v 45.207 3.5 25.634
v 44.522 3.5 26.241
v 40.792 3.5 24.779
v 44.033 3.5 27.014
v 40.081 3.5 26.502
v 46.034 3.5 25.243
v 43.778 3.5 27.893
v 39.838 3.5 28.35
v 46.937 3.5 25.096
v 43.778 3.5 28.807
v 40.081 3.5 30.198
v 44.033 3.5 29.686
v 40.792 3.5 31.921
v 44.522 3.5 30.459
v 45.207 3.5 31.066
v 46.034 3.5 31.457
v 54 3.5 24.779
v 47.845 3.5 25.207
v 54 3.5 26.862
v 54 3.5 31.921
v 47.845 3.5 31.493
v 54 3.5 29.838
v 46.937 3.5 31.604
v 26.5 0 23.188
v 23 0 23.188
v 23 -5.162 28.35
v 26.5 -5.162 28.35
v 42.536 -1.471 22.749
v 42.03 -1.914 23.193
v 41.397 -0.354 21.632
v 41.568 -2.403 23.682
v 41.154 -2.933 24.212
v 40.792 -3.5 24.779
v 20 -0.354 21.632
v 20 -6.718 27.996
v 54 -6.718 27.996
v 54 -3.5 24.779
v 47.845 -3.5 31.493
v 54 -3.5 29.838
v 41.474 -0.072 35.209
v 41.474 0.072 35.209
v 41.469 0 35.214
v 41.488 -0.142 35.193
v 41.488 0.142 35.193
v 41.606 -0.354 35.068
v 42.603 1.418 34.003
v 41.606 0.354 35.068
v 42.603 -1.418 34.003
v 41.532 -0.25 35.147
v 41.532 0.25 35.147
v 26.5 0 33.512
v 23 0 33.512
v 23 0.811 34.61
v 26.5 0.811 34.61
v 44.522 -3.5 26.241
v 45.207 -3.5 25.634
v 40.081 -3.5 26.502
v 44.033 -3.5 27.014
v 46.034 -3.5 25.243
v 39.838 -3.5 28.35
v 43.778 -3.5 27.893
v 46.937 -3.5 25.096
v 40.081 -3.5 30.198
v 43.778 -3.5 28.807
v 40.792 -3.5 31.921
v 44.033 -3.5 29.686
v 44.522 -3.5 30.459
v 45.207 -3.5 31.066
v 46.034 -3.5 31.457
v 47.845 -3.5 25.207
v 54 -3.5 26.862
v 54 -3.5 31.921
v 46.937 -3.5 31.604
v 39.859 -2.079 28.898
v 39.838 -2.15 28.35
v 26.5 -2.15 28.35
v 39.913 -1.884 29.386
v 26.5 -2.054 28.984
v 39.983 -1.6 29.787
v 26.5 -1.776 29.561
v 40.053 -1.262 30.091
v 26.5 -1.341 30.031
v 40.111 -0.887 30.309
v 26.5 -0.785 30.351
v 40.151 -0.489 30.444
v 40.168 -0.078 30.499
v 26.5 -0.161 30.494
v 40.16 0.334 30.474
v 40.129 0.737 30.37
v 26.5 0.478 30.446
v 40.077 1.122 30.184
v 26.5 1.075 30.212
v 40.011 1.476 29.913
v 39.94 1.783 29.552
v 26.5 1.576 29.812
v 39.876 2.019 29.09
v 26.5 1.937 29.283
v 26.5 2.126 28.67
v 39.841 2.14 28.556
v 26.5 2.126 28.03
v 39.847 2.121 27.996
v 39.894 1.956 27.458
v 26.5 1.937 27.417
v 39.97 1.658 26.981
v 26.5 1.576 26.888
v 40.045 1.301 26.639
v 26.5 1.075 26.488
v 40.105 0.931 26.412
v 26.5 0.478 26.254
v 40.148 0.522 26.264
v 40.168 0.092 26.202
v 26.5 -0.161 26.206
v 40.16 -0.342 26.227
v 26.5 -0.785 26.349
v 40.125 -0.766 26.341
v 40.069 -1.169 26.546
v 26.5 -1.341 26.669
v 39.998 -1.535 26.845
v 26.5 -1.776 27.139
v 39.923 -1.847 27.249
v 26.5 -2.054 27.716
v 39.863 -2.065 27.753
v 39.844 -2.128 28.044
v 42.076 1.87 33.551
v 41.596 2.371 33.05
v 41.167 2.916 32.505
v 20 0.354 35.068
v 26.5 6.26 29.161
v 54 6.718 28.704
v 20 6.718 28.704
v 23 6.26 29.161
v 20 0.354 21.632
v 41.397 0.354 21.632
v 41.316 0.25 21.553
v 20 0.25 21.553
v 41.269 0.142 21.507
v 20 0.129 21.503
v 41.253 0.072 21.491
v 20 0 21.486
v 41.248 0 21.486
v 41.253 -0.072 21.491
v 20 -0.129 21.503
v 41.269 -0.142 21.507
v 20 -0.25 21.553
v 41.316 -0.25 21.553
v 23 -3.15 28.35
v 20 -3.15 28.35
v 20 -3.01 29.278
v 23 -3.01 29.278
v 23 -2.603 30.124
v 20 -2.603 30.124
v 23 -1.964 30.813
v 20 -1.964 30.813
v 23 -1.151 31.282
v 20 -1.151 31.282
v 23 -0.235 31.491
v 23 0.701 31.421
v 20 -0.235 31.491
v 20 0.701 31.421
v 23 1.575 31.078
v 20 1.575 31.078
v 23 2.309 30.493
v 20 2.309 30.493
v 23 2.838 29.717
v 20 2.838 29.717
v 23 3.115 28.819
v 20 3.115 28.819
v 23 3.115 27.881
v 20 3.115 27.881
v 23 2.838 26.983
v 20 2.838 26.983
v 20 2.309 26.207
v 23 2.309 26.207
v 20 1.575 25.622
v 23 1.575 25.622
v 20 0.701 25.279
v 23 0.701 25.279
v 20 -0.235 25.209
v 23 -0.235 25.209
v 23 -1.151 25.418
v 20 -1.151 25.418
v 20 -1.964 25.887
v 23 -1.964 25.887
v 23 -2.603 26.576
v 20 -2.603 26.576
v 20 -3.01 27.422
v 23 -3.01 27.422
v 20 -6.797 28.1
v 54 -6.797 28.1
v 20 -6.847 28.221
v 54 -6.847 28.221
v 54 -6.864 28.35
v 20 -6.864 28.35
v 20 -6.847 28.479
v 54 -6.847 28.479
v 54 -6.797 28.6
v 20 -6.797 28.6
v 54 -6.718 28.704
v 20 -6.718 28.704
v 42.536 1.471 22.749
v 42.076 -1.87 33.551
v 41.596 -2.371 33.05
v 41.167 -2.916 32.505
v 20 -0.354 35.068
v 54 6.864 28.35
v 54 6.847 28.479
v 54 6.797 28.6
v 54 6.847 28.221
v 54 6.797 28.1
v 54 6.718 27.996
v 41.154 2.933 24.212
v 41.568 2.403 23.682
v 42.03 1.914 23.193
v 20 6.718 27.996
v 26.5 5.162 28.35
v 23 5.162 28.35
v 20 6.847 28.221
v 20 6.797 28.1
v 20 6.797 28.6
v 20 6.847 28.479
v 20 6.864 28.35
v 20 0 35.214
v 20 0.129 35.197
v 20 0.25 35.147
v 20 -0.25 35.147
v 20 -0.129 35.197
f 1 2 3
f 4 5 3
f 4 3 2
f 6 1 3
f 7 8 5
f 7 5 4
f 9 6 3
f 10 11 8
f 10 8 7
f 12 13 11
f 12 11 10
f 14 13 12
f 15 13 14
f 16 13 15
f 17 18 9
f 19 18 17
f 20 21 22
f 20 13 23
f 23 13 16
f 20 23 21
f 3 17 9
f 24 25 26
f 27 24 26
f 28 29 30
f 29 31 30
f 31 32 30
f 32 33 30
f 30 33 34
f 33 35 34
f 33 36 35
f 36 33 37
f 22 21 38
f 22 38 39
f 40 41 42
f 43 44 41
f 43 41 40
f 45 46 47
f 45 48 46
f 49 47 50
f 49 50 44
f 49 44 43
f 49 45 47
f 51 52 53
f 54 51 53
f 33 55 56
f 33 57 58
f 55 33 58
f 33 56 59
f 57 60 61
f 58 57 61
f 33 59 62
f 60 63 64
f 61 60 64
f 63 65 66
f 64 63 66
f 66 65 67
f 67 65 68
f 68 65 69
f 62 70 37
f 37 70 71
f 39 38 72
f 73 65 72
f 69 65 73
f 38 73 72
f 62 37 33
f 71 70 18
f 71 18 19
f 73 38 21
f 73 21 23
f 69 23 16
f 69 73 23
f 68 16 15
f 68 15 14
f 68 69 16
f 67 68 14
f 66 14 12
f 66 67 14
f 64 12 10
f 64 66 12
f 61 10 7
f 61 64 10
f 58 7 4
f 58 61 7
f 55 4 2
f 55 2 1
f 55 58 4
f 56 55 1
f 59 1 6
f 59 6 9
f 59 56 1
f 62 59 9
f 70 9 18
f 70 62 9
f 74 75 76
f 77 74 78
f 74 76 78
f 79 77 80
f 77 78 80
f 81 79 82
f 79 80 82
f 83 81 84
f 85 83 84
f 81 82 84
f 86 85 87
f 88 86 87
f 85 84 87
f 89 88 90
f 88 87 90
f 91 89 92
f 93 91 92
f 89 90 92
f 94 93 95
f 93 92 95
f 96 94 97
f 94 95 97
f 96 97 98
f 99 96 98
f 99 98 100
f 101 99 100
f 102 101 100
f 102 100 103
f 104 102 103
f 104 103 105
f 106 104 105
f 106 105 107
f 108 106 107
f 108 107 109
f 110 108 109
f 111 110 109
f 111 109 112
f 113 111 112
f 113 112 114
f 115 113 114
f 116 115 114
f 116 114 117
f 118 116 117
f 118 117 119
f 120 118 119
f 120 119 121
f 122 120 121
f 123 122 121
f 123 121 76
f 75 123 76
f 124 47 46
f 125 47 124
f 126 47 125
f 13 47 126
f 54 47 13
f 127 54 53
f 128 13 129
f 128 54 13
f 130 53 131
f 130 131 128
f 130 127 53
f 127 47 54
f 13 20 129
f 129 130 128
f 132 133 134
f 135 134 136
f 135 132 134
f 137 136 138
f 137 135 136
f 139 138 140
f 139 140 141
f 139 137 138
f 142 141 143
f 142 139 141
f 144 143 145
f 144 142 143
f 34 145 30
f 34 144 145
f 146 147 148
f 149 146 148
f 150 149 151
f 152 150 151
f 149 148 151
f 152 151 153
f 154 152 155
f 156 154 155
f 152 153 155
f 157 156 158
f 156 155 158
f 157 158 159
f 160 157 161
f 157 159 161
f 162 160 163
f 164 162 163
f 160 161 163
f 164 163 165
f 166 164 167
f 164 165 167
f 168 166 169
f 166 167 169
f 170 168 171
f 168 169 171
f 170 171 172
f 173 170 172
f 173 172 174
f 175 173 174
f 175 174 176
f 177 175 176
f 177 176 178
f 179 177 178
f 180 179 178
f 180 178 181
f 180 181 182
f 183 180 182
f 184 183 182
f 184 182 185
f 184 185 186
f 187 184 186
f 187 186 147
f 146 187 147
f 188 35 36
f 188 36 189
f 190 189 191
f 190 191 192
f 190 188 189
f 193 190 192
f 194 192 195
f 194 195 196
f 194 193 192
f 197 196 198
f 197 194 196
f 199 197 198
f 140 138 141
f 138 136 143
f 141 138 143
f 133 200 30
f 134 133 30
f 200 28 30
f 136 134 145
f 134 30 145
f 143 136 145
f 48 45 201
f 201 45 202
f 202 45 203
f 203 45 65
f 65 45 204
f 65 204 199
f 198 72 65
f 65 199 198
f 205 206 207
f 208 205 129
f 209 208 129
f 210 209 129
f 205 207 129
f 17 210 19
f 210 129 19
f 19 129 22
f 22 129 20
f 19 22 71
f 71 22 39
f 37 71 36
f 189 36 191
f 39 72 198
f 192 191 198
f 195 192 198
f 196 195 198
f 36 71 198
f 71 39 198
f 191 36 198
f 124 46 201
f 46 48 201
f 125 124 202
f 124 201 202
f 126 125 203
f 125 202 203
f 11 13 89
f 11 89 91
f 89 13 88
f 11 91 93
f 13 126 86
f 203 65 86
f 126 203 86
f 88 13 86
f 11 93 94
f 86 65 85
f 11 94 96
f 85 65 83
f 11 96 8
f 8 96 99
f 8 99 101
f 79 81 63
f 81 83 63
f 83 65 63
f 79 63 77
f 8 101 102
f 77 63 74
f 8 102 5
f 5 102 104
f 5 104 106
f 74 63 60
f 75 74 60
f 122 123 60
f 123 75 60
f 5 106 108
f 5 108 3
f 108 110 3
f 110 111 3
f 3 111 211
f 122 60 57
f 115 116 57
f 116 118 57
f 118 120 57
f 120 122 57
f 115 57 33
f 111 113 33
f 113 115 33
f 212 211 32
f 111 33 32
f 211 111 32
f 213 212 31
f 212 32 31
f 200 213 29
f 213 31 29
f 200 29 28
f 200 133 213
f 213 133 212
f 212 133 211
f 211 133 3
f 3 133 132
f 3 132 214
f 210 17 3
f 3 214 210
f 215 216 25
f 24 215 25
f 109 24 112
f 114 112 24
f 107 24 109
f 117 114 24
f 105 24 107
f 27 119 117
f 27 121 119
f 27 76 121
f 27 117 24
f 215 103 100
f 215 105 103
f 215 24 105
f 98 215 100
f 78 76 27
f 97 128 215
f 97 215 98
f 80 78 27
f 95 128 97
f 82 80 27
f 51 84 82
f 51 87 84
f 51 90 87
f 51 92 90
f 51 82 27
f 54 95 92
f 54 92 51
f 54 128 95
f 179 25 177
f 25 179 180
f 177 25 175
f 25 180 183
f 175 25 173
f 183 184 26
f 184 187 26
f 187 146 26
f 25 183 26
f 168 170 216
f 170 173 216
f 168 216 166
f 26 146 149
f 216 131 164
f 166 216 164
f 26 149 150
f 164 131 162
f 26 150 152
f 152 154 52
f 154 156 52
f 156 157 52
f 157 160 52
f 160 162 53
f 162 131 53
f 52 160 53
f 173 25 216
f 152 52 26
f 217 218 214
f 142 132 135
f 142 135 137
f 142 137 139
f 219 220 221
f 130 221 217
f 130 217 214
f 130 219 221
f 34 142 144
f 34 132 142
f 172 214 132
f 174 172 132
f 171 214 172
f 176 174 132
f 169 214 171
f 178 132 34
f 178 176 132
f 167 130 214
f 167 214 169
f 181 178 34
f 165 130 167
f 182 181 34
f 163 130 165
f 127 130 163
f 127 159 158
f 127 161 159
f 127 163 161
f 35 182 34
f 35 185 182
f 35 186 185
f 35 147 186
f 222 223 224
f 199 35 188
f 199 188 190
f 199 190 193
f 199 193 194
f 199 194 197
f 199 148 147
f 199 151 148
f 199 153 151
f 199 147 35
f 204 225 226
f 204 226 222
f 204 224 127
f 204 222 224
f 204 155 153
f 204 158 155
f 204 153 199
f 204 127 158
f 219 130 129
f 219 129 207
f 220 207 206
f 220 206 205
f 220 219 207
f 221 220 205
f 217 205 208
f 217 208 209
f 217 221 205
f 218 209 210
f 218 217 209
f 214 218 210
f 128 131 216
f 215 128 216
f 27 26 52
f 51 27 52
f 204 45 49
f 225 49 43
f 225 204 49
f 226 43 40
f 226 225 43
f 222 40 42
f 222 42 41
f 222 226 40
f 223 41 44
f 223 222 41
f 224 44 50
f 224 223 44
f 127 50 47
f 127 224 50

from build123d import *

# Parameters (mm, degrees)
PAD023_DEPTH         = 34
POCKET032_DEPTH      = 6.864961
POCKET032_DEPTH_BACK = 6.864961
POCKET033_DEPTH      = 3.5
SKETCH057_R          = 2.15
POCKET034_DEPTH      = 21
POCKET035_DEPTH      = 3.5
SKETCH069_R          = 3.15
POCKET036_DEPTH      = 4


with BuildPart() as part:
    # Sketch054 → Pad023 (new body)
    with BuildSketch(Plane(origin=(20, 0, 28.35), x_dir=(0, -1, 0), z_dir=(-1, 0, 0))):
        with BuildLine():
            Line((-0.353553, 6.717514), (-6.717514, 0.353553))
            ThreePointArc((-6.717514, 0.353553), (-6.863961, 0), (-6.717514, -0.353553))
            Line((-0.353553, -6.717514), (-6.717514, -0.353553))
            ThreePointArc((-0.353553, -6.717514), (0, -6.863961), (0.353553, -6.717514))
            Line((6.717514, -0.353553), (0.353553, -6.717514))
            ThreePointArc((6.717514, -0.353553), (6.863961, 0), (6.717514, 0.353553))
            Line((0.353553, 6.717514), (6.717514, 0.353553))
            ThreePointArc((0.353553, 6.717514), (0, 6.863961), (-0.353553, 6.717514))
        make_face()
    extrude(amount=-PAD023_DEPTH)

    # Sketch067 → Pocket032 (cut, two sides)
    with BuildSketch(Plane(origin=(47, 0, 28.35), x_dir=(1, 0, 0), z_dir=(0, -1, 0))) as pocket032_sk:
        Polygon((-10.885376, 12.57942), (24.170823, 12.57942), (24.170823, 4.191882), (-3.027771, 4.191882), align=None)
        Polygon((24.170823, -4.191882), (-3.027771, -4.191882), (-11.580444, -12.57942), (24.170823, -12.57942), align=None)
    extrude(amount=-POCKET032_DEPTH, mode=Mode.SUBTRACT)
    extrude(pocket032_sk.sketch, amount=POCKET032_DEPTH_BACK, mode=Mode.SUBTRACT)

    # Sketch056 → Pocket033 (cut, symmetric)
    with BuildSketch(Plane(origin=(47, 0, 28.35), x_dir=(1, 0, 0), z_dir=(0, -1, 0))):
        with BuildLine():
            Line((20.145038, 2), (1.859623, 6.916416))
            ThreePointArc((1.859623, 6.916416), (-7.162053, 0), (1.859623, -6.916416))
            Line((20.145038, -2), (1.859623, -6.916416))
            Line((20.145038, 2), (20.145038, -2))
        make_face()
        with BuildLine():
            ThreePointArc((0.844932, 3.142521), (-3.254128, 0), (0.844932, -3.142521))
            Line((0.844932, -3.142521), (12.532776, 0))
            Line((0.844932, 3.142521), (12.532776, 0))
        make_face(mode=Mode.SUBTRACT)
    extrude(amount=POCKET033_DEPTH, both=True, mode=Mode.SUBTRACT)

    # Sketch057 → Pocket034 (cut)
    with BuildSketch(Plane(origin=(20, 0, 28.35), x_dir=(0, -1, 0), z_dir=(-1, 0, 0))):
        Circle(SKETCH057_R)
    extrude(amount=-POCKET034_DEPTH, mode=Mode.SUBTRACT)

    # Sketch068 → Pocket035 (cut)
    with BuildSketch(Plane(origin=(23, 0, 28.35), x_dir=(0, -0.707107, 0.707107), z_dir=(-1, 0, 0))):
        Polygon((-3.65, -3.65), (3.65, -3.65), (3.65, 3.65), (4.4, 8.65), (-4.4, 8.65), (-3.65, 3.65), align=None)
    extrude(amount=-POCKET035_DEPTH, mode=Mode.SUBTRACT)

    # Sketch069 → Pocket036 (cut)
    with BuildSketch(Plane(origin=(20, 0, 28.35), x_dir=(0, -1, 0), z_dir=(-1, 0, 0))):
        Circle(SKETCH069_R)
    extrude(amount=-POCKET036_DEPTH, mode=Mode.SUBTRACT)


solid = part.part
